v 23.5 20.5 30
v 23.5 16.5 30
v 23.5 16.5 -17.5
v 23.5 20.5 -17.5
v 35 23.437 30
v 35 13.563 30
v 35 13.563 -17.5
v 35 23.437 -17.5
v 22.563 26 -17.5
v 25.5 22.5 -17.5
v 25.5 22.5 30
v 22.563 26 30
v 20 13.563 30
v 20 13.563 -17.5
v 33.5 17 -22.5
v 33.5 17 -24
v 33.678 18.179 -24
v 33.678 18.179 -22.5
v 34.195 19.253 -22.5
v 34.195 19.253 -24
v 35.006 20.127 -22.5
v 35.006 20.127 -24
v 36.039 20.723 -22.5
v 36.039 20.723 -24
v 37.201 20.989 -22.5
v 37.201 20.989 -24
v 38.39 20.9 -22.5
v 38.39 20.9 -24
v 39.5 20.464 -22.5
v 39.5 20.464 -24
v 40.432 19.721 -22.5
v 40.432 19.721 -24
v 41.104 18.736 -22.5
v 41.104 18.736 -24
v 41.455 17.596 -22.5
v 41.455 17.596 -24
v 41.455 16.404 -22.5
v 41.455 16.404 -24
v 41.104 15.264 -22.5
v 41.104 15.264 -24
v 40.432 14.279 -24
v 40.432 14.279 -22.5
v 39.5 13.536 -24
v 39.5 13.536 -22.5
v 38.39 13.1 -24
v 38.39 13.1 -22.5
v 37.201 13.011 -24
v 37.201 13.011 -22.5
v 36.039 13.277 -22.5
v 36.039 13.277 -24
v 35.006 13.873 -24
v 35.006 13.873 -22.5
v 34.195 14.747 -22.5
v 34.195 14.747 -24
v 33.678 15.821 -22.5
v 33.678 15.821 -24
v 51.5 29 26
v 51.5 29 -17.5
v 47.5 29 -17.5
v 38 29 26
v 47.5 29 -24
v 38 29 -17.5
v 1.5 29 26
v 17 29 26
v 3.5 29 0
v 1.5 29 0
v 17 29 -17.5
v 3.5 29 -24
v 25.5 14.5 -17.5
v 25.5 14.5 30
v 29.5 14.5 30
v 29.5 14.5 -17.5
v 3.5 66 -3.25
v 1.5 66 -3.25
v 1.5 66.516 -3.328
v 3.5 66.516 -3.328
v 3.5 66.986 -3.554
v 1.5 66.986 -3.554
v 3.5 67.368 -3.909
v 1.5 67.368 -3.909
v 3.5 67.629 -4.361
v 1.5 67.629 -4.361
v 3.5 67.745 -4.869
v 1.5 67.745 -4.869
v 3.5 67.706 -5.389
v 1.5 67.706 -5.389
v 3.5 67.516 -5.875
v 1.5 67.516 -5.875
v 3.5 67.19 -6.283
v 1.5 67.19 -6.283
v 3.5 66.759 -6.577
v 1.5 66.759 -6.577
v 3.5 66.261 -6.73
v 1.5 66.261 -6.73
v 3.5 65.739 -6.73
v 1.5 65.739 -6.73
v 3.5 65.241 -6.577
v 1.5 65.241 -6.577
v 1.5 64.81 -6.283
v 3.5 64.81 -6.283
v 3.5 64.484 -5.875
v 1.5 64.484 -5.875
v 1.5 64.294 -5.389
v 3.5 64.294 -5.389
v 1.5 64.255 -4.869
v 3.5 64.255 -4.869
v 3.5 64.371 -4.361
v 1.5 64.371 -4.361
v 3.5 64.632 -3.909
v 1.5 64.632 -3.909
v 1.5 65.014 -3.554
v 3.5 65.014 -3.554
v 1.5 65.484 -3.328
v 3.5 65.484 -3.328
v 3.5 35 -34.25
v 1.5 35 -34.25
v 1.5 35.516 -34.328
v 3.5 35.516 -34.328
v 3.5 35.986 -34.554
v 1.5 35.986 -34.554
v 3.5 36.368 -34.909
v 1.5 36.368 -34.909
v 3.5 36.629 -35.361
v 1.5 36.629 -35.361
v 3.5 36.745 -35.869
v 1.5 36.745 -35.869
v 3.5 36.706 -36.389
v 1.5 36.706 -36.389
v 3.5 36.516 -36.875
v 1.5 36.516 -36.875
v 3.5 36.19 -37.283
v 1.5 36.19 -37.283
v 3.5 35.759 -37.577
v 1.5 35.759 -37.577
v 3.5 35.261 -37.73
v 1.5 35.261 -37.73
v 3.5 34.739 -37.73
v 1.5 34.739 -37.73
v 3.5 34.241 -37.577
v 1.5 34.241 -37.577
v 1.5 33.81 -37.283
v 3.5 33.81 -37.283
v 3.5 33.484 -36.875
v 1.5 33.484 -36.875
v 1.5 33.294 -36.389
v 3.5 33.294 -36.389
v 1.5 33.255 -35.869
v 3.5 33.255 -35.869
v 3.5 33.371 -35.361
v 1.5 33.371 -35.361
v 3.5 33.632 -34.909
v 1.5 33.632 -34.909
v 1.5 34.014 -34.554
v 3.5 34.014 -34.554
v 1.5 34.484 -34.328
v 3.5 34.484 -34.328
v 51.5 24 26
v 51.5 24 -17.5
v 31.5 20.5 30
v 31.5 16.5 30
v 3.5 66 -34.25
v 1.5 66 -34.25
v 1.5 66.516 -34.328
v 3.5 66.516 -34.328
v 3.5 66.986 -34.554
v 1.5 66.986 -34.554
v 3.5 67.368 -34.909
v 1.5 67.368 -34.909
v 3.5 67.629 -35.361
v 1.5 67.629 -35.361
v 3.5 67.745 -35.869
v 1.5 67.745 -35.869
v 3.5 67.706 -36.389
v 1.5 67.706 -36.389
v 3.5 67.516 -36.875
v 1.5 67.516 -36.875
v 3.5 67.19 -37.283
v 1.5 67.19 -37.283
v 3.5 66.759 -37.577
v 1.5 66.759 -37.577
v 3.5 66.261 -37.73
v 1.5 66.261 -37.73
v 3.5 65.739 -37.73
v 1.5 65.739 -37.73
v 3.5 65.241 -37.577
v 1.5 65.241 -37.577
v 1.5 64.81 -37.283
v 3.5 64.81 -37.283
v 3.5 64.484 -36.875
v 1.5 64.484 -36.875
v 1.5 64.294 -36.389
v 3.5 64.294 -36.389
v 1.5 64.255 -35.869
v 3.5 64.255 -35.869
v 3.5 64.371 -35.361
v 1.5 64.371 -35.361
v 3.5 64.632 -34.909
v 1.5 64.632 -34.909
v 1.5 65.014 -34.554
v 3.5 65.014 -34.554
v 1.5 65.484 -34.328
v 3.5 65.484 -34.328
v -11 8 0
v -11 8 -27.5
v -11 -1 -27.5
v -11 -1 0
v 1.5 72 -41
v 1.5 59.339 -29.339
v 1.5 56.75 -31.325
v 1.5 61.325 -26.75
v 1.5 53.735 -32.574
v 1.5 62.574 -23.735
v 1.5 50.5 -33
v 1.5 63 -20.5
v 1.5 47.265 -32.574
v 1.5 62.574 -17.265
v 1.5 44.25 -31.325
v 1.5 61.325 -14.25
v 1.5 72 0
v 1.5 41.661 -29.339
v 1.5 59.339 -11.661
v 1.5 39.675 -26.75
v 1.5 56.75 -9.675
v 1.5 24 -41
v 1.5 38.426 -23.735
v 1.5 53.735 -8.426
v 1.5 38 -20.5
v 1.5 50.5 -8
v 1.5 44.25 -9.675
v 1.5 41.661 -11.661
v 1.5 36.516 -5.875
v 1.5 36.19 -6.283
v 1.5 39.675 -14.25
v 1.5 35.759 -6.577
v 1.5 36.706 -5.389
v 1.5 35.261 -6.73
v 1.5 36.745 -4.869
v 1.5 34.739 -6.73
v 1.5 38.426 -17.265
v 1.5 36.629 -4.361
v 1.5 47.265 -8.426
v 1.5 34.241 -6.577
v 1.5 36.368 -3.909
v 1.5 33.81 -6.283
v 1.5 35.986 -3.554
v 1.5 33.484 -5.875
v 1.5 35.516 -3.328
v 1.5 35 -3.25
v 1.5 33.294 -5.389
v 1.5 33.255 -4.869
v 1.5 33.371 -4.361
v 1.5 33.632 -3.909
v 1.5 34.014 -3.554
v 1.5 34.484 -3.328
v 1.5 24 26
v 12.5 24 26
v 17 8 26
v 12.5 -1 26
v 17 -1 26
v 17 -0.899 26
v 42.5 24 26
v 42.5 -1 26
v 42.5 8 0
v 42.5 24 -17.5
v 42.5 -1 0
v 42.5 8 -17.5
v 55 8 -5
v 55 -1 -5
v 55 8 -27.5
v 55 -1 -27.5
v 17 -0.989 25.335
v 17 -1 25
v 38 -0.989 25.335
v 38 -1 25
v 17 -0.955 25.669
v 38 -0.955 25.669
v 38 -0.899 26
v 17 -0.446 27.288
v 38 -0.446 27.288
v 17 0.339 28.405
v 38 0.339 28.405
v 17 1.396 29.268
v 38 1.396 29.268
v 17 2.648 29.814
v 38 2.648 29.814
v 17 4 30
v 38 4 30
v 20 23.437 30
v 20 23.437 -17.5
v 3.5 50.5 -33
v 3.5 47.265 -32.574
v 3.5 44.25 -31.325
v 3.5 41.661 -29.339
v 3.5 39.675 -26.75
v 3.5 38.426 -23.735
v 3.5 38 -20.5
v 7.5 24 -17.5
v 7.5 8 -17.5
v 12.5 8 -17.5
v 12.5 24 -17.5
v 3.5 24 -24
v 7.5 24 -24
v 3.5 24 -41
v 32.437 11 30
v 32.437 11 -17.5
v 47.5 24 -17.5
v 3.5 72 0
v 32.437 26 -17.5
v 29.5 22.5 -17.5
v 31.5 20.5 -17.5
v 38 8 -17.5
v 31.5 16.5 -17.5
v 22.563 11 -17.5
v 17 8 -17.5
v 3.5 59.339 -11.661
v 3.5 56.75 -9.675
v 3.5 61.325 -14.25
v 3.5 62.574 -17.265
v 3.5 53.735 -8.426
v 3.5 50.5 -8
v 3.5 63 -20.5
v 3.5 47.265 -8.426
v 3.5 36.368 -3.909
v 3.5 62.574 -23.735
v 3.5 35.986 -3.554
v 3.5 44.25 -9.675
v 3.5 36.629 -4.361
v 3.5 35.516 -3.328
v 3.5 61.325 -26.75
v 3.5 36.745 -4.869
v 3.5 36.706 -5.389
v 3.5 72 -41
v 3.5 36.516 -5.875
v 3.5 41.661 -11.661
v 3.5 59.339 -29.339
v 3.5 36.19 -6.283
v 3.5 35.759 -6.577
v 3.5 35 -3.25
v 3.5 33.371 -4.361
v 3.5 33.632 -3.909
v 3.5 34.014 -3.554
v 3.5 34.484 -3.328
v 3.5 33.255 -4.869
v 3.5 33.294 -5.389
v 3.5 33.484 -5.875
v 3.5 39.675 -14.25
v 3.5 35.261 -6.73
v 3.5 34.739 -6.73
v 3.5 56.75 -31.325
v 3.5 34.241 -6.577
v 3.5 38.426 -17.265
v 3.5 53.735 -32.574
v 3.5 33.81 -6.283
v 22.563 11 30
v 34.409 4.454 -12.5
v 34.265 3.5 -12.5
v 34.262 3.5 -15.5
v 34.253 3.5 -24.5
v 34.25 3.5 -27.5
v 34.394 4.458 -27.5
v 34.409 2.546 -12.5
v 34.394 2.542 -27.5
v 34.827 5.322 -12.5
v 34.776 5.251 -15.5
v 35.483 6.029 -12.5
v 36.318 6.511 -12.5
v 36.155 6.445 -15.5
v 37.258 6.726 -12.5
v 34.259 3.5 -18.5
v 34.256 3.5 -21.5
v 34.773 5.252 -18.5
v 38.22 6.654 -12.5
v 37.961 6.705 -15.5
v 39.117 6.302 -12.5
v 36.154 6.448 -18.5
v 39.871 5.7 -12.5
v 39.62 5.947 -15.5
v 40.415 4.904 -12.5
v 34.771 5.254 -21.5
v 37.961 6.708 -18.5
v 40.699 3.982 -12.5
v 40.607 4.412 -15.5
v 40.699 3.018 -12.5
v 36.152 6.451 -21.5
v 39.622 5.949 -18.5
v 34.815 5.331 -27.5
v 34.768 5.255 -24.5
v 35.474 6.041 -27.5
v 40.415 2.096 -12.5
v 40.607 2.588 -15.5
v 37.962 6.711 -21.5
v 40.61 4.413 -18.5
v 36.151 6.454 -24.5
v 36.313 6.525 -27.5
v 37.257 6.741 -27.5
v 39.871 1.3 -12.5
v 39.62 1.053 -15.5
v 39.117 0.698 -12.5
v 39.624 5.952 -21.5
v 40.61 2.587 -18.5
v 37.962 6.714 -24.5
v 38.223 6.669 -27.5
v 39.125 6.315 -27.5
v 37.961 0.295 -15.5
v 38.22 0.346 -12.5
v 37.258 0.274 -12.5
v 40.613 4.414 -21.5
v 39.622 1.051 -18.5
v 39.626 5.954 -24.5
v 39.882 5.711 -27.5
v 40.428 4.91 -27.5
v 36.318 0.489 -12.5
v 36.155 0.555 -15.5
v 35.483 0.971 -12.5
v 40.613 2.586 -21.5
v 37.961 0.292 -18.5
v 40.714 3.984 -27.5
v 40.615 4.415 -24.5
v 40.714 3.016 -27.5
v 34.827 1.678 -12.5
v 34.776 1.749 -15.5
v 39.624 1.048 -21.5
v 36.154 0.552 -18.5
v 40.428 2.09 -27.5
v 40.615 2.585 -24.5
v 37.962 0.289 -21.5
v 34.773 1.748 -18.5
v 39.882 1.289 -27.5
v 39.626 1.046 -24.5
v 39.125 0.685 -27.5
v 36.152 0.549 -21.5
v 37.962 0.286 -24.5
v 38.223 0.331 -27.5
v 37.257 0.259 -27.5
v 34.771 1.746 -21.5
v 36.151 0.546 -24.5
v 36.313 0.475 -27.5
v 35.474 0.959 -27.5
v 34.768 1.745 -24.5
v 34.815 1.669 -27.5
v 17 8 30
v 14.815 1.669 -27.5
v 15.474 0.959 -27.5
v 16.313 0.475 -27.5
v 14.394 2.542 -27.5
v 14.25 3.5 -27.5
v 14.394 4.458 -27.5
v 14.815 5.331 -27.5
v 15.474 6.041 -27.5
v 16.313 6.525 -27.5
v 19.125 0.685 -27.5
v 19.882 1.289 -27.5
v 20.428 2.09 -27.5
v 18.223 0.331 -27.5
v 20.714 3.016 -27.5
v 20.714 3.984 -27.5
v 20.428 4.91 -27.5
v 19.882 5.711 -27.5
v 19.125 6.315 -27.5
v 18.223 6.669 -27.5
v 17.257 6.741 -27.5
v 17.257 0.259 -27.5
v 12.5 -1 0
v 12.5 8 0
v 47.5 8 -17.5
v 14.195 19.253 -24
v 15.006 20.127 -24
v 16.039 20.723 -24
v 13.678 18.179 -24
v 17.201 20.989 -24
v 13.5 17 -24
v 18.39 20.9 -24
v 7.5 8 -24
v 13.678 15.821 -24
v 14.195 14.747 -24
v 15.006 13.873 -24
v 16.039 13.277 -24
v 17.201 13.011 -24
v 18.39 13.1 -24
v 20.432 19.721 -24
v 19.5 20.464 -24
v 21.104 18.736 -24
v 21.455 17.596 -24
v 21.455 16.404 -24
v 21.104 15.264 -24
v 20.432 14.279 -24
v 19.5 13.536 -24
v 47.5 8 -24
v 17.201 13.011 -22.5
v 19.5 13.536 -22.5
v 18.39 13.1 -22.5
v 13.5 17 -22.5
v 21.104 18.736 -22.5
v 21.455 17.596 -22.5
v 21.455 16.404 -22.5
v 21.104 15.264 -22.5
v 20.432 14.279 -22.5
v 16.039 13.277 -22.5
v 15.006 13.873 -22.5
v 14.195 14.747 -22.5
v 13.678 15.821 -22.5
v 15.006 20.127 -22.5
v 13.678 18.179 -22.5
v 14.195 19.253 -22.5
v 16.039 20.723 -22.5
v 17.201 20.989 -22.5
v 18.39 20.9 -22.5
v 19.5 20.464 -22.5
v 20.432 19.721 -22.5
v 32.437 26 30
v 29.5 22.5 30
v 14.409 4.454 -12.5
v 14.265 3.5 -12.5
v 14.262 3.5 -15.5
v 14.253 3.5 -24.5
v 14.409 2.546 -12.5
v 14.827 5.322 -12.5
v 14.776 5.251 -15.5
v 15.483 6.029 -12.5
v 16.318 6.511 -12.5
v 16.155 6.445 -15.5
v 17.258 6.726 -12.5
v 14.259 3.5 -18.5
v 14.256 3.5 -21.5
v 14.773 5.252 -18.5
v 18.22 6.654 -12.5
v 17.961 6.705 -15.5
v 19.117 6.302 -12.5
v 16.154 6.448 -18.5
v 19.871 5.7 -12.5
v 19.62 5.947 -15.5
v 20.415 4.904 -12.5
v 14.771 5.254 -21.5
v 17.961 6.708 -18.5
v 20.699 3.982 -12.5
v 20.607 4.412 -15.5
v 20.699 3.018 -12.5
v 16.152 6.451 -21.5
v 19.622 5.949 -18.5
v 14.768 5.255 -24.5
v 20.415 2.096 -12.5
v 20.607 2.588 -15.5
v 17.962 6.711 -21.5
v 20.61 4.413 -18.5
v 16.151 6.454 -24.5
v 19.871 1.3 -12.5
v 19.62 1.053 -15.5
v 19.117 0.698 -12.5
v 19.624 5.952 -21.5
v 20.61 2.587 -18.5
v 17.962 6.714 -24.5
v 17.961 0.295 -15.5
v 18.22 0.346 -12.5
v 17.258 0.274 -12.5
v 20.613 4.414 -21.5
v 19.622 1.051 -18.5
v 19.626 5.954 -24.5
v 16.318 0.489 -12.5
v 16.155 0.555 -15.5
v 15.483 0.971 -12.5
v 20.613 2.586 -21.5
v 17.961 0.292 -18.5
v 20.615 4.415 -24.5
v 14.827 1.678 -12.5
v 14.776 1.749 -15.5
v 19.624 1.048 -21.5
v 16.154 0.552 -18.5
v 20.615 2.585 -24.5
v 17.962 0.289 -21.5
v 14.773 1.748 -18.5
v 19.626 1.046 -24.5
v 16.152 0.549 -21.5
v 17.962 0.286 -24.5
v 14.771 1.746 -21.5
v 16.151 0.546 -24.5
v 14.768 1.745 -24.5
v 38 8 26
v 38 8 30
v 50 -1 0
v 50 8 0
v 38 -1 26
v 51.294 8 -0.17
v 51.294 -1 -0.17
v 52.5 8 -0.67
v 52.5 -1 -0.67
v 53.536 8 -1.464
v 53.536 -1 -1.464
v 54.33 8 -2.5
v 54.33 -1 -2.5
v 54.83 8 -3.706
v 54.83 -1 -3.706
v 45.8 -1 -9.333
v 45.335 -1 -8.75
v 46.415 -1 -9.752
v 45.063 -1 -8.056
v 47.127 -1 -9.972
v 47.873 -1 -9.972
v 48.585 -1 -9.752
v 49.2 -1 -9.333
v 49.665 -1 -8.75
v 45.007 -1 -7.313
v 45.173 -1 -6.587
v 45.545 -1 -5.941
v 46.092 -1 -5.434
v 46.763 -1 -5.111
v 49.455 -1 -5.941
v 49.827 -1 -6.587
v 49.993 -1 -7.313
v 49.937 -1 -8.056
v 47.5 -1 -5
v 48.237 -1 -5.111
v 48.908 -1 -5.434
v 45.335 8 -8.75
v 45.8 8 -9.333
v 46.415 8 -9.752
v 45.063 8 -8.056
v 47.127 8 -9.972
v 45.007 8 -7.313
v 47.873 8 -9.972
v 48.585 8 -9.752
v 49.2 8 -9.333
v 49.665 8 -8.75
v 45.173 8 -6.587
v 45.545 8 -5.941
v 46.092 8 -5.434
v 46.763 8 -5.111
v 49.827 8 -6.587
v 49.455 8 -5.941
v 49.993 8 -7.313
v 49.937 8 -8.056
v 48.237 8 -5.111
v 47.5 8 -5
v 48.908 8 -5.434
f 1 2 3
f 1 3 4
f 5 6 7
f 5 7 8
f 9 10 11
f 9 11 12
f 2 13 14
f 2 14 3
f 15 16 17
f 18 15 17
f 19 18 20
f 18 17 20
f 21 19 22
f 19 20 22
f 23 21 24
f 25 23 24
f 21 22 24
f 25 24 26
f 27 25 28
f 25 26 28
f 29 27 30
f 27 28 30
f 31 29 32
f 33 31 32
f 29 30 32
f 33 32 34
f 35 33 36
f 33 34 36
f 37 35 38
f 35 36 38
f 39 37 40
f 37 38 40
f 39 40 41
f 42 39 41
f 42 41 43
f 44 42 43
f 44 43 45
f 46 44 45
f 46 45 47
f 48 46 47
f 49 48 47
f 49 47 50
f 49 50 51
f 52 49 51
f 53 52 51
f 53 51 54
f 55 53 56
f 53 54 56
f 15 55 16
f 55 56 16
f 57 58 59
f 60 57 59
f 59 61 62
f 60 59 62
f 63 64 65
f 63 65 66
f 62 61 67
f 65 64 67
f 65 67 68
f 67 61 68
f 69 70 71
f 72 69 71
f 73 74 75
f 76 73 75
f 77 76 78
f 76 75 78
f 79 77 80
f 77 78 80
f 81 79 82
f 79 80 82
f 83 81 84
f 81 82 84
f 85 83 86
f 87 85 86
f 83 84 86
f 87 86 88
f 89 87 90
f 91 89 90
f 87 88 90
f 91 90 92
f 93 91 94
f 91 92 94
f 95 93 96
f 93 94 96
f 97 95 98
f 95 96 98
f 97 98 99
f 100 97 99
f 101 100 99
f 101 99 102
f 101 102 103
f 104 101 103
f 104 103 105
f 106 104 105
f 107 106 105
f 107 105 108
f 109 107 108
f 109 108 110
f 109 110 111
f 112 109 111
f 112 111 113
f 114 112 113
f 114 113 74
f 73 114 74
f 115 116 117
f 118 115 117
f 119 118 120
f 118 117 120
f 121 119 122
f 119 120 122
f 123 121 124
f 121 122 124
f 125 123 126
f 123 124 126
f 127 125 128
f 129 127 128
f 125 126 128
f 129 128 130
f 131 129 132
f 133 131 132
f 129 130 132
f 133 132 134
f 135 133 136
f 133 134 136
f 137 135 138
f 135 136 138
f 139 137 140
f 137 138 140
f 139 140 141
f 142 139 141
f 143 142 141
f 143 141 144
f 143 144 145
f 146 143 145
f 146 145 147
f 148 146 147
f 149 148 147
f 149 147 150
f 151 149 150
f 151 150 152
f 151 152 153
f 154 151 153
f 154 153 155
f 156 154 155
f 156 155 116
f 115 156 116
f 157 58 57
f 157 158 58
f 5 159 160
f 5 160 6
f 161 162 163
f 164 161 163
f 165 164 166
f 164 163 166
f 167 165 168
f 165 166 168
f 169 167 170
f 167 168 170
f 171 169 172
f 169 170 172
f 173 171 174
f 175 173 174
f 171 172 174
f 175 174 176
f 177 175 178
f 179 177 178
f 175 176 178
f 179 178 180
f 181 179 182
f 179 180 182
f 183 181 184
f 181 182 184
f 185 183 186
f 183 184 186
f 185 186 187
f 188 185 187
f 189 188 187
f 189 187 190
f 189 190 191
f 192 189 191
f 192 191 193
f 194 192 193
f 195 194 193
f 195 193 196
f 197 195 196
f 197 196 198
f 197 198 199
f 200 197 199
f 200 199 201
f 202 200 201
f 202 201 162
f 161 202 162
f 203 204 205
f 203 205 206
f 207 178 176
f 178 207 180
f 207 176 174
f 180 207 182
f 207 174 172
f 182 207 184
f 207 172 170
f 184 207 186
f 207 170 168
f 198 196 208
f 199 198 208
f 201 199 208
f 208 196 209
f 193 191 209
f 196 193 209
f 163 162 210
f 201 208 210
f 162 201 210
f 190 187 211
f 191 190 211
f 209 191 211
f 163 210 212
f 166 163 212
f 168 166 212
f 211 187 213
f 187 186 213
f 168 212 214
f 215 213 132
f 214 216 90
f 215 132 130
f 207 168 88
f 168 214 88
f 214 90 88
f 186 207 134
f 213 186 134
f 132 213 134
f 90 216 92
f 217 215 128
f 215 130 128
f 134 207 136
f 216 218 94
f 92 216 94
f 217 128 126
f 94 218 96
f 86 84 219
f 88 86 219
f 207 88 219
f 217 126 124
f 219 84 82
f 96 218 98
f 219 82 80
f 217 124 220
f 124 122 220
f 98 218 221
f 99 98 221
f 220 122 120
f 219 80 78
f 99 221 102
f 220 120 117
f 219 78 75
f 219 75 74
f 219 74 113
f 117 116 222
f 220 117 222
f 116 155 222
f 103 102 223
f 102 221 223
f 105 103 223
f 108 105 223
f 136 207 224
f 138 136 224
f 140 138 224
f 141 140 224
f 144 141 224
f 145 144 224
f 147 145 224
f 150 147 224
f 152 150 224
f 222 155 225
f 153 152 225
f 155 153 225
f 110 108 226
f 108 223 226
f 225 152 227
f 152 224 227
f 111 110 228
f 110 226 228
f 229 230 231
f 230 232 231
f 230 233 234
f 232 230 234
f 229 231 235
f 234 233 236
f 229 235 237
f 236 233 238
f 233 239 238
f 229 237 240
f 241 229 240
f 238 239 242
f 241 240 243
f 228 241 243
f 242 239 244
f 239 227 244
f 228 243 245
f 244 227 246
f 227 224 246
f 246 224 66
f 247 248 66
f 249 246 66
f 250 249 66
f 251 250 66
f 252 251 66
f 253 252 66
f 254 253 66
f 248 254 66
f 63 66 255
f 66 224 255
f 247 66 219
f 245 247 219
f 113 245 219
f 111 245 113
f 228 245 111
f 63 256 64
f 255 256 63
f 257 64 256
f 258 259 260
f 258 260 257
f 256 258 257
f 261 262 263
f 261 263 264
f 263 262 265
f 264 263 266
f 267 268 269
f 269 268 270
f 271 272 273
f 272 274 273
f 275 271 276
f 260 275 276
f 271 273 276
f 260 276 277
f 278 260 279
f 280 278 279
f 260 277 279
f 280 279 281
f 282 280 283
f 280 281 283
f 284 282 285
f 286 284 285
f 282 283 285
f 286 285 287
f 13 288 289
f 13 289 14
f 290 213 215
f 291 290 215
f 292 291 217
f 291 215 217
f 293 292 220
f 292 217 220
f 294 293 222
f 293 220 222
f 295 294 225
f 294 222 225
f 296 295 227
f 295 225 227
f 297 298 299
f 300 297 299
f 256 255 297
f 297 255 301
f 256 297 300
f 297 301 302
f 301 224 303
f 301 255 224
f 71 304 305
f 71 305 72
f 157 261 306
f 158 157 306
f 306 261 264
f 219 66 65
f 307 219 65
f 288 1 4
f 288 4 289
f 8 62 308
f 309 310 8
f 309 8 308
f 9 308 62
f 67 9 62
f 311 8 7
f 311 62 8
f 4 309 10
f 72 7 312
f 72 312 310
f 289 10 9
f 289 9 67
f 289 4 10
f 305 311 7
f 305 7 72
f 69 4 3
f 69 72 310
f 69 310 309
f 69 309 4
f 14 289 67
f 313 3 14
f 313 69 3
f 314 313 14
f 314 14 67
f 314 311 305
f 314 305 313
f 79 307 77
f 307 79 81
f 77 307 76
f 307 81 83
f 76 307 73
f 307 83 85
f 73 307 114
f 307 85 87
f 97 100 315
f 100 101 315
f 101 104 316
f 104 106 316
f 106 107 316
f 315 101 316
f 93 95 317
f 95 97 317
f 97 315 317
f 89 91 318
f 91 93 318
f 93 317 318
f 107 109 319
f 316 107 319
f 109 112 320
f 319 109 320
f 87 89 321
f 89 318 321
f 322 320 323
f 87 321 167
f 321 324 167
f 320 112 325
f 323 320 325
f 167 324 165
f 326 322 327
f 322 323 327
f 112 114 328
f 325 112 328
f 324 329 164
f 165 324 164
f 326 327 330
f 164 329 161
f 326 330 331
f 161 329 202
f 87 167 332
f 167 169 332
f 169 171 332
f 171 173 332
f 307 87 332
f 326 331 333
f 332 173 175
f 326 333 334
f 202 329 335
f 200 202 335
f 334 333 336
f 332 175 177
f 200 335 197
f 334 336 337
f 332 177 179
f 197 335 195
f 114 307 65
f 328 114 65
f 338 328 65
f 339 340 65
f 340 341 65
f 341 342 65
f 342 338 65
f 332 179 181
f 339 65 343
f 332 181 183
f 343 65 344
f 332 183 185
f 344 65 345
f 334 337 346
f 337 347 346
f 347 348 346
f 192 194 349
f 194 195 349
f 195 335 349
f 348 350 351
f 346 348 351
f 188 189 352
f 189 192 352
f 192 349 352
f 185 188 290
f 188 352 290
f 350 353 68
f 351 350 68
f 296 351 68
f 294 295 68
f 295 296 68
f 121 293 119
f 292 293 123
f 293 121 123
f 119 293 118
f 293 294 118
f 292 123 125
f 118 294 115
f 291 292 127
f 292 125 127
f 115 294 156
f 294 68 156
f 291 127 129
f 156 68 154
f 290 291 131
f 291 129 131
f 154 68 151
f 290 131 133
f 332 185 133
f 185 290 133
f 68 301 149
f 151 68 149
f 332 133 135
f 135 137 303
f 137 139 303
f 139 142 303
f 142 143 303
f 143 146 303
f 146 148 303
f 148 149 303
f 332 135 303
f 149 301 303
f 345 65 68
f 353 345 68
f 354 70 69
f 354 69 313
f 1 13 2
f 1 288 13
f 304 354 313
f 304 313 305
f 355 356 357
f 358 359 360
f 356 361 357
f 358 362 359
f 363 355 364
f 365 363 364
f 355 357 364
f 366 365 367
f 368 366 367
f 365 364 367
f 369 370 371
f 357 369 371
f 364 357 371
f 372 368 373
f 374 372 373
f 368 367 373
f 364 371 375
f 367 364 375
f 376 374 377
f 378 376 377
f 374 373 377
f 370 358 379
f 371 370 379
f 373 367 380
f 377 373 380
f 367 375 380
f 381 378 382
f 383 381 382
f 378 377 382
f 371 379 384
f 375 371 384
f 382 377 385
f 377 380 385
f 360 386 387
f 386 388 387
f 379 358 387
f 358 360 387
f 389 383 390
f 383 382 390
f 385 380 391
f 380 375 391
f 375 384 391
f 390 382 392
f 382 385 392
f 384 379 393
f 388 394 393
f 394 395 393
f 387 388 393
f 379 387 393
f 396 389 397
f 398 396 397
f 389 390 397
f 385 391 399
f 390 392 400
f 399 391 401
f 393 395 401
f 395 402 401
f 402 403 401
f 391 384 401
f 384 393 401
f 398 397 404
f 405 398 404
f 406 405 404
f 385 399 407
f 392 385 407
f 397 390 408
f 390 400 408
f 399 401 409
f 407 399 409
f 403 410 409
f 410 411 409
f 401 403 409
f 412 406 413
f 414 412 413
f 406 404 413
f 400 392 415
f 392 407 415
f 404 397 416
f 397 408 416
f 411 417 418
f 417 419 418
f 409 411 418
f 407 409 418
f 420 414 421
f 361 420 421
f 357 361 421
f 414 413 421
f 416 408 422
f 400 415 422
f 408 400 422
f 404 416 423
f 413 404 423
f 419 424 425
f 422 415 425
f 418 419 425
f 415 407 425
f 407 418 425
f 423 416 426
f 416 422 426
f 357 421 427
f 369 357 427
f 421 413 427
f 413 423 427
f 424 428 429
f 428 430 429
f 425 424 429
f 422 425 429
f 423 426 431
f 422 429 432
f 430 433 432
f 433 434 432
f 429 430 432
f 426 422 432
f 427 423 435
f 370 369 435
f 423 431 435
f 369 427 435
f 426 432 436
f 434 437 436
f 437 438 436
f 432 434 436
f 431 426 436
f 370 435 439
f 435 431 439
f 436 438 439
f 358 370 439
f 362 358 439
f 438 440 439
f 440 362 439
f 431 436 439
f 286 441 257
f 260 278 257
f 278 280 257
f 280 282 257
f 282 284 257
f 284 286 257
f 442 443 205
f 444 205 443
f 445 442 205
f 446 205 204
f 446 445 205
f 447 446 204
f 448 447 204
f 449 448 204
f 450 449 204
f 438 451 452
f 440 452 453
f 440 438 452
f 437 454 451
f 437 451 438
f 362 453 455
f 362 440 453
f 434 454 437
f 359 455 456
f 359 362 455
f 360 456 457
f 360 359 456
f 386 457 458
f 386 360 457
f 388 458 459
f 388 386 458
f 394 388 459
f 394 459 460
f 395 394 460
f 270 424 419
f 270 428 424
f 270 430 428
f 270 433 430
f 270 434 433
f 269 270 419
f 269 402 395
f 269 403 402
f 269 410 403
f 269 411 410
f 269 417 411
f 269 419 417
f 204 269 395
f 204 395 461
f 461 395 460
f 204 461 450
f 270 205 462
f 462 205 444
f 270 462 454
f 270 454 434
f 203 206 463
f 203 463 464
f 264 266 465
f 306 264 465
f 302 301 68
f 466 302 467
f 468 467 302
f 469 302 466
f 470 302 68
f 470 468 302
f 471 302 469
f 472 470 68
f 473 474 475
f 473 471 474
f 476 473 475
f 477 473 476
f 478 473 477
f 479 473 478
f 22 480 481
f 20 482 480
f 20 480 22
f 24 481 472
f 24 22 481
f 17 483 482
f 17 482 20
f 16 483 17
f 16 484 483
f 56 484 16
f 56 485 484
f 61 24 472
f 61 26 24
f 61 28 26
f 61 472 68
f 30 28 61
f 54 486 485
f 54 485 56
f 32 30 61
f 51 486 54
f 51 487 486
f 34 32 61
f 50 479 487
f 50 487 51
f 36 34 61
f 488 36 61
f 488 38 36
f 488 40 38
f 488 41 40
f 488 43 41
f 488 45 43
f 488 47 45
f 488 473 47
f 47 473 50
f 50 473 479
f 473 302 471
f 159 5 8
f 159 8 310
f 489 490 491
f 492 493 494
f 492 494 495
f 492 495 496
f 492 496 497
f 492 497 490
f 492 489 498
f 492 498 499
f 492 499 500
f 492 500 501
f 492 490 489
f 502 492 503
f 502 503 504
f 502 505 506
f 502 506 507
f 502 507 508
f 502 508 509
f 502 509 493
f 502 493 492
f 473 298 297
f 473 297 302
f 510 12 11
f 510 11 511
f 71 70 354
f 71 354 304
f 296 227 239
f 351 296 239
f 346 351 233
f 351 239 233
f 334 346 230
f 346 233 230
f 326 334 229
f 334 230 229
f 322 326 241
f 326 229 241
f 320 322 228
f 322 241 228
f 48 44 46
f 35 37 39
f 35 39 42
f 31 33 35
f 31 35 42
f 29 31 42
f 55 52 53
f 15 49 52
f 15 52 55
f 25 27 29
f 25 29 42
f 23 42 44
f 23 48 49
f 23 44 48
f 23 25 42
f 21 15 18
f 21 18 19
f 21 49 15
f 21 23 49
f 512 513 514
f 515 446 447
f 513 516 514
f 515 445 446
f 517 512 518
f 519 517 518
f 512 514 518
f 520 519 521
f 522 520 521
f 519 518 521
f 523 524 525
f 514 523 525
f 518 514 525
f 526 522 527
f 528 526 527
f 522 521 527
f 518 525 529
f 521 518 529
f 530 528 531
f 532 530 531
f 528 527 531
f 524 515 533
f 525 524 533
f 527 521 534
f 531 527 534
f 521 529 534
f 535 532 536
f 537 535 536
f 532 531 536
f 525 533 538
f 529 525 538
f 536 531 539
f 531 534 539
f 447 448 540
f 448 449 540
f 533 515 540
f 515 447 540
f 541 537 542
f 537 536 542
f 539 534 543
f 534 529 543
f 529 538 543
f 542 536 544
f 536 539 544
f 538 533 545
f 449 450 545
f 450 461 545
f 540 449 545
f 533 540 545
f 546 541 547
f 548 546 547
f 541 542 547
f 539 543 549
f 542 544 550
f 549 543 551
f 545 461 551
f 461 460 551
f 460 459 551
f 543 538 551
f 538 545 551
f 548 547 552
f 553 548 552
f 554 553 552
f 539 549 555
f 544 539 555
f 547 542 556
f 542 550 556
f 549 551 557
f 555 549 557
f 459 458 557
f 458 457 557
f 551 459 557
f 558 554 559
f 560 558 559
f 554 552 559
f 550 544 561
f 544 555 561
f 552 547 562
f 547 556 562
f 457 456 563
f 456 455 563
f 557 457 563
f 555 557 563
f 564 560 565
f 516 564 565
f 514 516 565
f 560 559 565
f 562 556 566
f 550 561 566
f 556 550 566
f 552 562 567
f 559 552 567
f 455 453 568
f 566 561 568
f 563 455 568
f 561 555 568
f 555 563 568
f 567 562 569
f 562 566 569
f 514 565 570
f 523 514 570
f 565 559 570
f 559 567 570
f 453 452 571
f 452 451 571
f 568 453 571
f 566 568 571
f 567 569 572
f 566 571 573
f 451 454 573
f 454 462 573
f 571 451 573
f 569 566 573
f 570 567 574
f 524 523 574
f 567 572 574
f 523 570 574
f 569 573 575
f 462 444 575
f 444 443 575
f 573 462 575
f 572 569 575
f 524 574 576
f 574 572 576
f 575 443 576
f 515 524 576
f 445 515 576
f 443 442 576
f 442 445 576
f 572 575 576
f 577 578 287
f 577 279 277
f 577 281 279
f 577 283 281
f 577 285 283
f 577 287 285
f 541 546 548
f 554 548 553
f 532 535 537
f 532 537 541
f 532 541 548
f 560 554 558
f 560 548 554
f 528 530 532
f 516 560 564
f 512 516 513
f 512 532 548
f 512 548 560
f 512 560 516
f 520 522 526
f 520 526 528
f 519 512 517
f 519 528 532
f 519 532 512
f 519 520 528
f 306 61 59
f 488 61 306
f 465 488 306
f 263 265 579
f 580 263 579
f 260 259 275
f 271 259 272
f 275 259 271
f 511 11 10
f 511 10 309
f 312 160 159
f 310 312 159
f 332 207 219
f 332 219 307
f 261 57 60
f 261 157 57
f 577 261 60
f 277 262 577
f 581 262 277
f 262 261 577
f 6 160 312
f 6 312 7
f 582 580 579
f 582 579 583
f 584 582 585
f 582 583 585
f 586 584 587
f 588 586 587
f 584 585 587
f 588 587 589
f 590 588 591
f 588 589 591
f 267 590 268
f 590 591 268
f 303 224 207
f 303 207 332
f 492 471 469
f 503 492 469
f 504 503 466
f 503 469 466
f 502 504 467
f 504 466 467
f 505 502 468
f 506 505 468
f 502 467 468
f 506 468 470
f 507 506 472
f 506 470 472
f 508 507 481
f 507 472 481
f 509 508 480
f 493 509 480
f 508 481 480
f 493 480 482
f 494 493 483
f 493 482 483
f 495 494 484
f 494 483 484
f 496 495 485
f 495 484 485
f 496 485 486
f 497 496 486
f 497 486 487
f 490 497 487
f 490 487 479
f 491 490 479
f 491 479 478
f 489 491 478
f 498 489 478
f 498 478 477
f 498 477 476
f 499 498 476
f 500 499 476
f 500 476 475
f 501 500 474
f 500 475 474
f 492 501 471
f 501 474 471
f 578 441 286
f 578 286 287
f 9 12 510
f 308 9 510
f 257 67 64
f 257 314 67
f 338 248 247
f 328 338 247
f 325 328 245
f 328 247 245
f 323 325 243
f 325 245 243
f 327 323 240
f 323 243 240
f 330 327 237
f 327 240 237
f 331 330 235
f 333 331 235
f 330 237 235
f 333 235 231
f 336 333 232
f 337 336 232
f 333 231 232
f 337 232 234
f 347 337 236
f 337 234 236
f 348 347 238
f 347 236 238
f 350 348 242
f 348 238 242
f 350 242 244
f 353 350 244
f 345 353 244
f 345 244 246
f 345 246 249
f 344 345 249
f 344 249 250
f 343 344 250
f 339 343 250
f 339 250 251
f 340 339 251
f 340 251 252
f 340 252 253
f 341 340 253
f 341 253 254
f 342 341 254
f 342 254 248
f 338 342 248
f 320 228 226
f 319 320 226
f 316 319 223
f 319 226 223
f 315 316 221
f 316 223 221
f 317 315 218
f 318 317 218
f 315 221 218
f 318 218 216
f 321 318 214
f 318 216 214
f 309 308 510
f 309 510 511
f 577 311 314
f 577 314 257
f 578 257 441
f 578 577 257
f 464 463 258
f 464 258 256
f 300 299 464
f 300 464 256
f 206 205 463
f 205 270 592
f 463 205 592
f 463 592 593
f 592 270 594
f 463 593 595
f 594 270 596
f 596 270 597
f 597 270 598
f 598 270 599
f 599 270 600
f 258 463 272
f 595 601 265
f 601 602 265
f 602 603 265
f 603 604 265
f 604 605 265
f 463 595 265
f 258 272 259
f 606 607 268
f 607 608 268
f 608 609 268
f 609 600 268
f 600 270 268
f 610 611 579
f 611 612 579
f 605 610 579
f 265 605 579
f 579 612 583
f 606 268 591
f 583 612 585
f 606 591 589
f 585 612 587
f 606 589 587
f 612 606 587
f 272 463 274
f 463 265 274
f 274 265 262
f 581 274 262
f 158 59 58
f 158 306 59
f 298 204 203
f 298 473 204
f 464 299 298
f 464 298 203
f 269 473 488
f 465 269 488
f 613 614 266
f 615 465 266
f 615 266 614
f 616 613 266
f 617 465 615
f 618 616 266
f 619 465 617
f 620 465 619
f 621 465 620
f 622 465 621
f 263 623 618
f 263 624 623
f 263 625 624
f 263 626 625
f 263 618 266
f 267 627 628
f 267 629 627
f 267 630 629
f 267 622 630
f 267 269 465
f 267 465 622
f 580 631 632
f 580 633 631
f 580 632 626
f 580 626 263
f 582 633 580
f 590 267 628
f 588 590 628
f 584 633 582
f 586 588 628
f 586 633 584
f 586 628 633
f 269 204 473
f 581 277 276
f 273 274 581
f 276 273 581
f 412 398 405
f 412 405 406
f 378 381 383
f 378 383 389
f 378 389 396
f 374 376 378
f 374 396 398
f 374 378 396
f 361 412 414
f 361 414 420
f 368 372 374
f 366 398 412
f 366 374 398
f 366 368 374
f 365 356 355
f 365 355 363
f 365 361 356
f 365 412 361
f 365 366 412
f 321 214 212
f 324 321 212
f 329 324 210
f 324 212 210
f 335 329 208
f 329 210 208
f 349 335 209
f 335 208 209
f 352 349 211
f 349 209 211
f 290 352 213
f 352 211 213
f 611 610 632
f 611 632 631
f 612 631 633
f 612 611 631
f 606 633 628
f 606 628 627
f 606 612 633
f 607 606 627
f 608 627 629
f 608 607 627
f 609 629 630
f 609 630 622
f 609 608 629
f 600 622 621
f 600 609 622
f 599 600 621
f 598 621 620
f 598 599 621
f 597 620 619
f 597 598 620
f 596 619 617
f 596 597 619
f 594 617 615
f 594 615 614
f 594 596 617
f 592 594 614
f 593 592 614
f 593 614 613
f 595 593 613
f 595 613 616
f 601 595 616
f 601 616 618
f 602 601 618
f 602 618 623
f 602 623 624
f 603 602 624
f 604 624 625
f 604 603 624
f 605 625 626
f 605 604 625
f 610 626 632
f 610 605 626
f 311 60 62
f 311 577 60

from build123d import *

# Parameters (mm, degrees)
BOSS_EXTRUDE2_DEPTH          = 8
BOSS_EXTRUDE2_DEPTH_BACK     = 1
SKETCH1_R                    = 2.5
CUT_EXTRUDE1_DEPTH           = 79.300702423
CUT_EXTRUDE1_DEPTH_BACK      = 79.300702423
SKETCH2_R                    = 2.5
SKETCH3_R                    = 3.25
CUT_EXTRUDE5_DEPTH           = 15
CUT_EXTRUDE5_DRAFT           = -0.0573
CUT_EXTRUDE5_PROFILE_2_DEPTH = 15
CUT_EXTRUDE5_PROFILE_2_DRAFT = -0.0573
SKETCH5_W                    = 4.5
SKETCH5_H                    = 6.5
BOSS_EXTRUDE3_DEPTH          = 14.5
SKETCH6_R                    = 4
CUT_EXTRUDE4_DEPTH           = 1.5
SKETCH12_W                   = 10.5
SKETCH12_H                   = 30
BOSS_EXTRUDE7_DEPTH          = 9
SKETCH15_W                   = 9
SKETCH15_H                   = 6.5
BOSS_EXTRUDE8_DEPTH          = 3.5
BOSS_EXTRUDE9_DEPTH          = 54
FILLET4_R                    = 5
SKETCH18_W                   = 9.873697418
SKETCH18_H                   = 6.5
BOSS_EXTRUDE11_DEPTH         = 0.5
SKETCH20_W                   = 4
SKETCH20_H                   = 17.5
BOSS_EXTRUDE12_DEPTH         = 18
BOSS_EXTRUDE13_DEPTH         = 11
BOSS_EXTRUDE13_DEPTH_BACK    = 4
SKETCH22_W                   = 17.5
SKETCH22_H                   = 4
SKETCH25_W                   = 2
SKETCH25_H                   = 17.5
BOSS_EXTRUDE14_DEPTH         = 41
SKETCH28_W                   = 41
SKETCH28_H                   = 45
BOSS_EXTRUDE15_DEPTH         = 2
SKETCH29_R                   = 1.75
CUT_EXTRUDE8_DEPTH           = 9
BOSS_EXTRUDE16_DEPTH         = 9
BOSS_EXTRUDE16_DEPTH_BACK    = 4
SKETCH30_W                   = 17.5
SKETCH30_H                   = 2
CUT_EXTRUDE9_DEPTH           = 9
SKETCH32_W                   = 13
SKETCH32_H                   = 4
BOSS_EXTRUDE17_DEPTH         = 23.5
SKETCH33_W                   = 0.5
SKETCH33_H                   = 17.5
BOSS_EXTRUDE18_DEPTH         = 20
SKETCH34_W                   = 4.5
SKETCH34_H                   = 25
SKETCH34_W_2                 = 15.5
SKETCH34_H_2                 = 4
SKETCH34_W_3                 = 9
BOSS_EXTRUDE19_DEPTH         = 26
SKETCH35_W                   = 9.873697418
SKETCH35_H                   = 0.5
BOSS_EXTRUDE20_DEPTH         = 47.5
BOSS_EXTRUDE21_DEPTH         = 47.5
SKETCH38_W                   = 0.419549816
SKETCH38_H                   = 18.5
CUT_EXTRUDE10_DEPTH          = 90.5
SKETCH46_W                   = 22.5
SKETCH46_H                   = 9
SKETCH46_W_2                 = 5
BOSS_EXTRUDE26_DEPTH         = 11.5
SKETCH47_W                   = 27.5
SKETCH47_H                   = 9
BOSS_EXTRUDE27_DEPTH         = 11
SKETCH48_W                   = 5
SKETCH48_H                   = 6.5
BOSS_EXTRUDE31_DEPTH         = 18.5
SKETCH50_R                   = 4
CUT_EXTRUDE11_DEPTH          = 1.5
SKETCH51_W                   = 9.626242636
SKETCH51_H                   = 9.125298808
BOSS_EXTRUDE32_DEPTH         = 1.5
BOSS_EXTRUDE35_DEPTH         = 47.5
SKETCH55_W                   = 9.873697418
SKETCH55_H                   = 0.5
CUT_EXTRUDE12_DEPTH          = 47.5
BOSS_EXTRUDE37_DEPTH         = 47.5
CUT_EXTRUDE17_DEPTH          = 47.5
SKETCH62_W                   = 8
SKETCH62_H                   = 8
CUT_EXTRUDE18_DEPTH          = 47.5
SKETCH63_W                   = 13
SKETCH63_H                   = 4
CUT_EXTRUDE20_DEPTH          = 17
SKETCH64_W                   = 0.5
SKETCH64_H                   = 1.5
BOSS_EXTRUDE38_DEPTH         = 6.5
SKETCH65_W                   = 7
SKETCH65_H                   = 3
CUT_EXTRUDE21_DEPTH          = 1.5
BOSS_EXTRUDE39_START         = -2
BOSS_EXTRUDE39_DEPTH         = 2
CUT_EXTRUDE22_DEPTH          = 155
BOSS_EXTRUDE40_DEPTH         = 1.5
SKETCH70_W                   = 2
SKETCH70_H                   = 41
BOSS_EXTRUDE41_DEPTH         = 3
BOSS_EXTRUDE42_DEPTH         = 1


with BuildPart() as part:
    # Sketch1 → Boss-Extrude2 (new, two sides: drawn at the far end of the back side and taken through both)
    with BuildSketch(Plane(origin=(0, 0, 0), x_dir=(1, 0, 0), z_dir=(0, 1, 0)).offset(-BOSS_EXTRUDE2_DEPTH_BACK)):
        with BuildLine():
            Line((5, 0), (50, 0))
            ThreePointArc((50, 0), (53.535533906, 1.464466094), (55, 5))
            Line((55, 5), (55, 50))
            ThreePointArc((55, 50), (53.535533906, 53.535533906), (50, 55))
            Line((50, 55), (5, 55))
            ThreePointArc((5, 55), (1.464466094, 53.535533906), (0, 50))
            Line((0, 50), (0, 5))
            ThreePointArc((0, 5), (1.464466094, 1.464466094), (5, 0))
        make_face()
        with Locations(Location((7.5, 47.5, 0), (0, 0, 270))):
            Circle(SKETCH1_R, mode=Mode.SUBTRACT)
        with Locations(Location((47.5, 47.5, 0), (0, 0, 270))):
            Circle(SKETCH1_R, mode=Mode.SUBTRACT)
        with Locations(Location((47.5, 7.5, 0), (0, 0, 270))):
            Circle(SKETCH1_R, mode=Mode.SUBTRACT)
        with Locations(Location((7.5, 7.5, 0), (0, 0, 270))):
            Circle(SKETCH1_R, mode=Mode.SUBTRACT)
    extrude(amount=BOSS_EXTRUDE2_DEPTH + BOSS_EXTRUDE2_DEPTH_BACK)

    # Sketch2 → Cut-Extrude1 (cut, two sides: drawn at the far end of the back side and taken through both)
    with BuildSketch(Plane(origin=(0, 8, 0), x_dir=(1, 0, 0), z_dir=(0, 1, 0)).offset(-CUT_EXTRUDE1_DEPTH_BACK)):
        with BuildLine():
            Line((0, 50), (0, 27.5))
            Line((0, 27.5), (55, 27.5))
            Line((55, 27.5), (55, 50))
            ThreePointArc((55, 50), (53.535533906, 53.535533906), (50, 55))
            Line((50, 55), (5, 55))
            ThreePointArc((5, 55), (1.464466094, 53.535533906), (0, 50))
        make_face()
        with Locations((7.5, 47.5)):
            Circle(SKETCH2_R, mode=Mode.SUBTRACT)
        with Locations((47.5, 47.5)):
            Circle(SKETCH2_R, mode=Mode.SUBTRACT)
    extrude(amount=CUT_EXTRUDE1_DEPTH + CUT_EXTRUDE1_DEPTH_BACK, mode=Mode.SUBTRACT)


with BuildPart() as cut_extrude5_tool:
    # Sketch3 → Cut-Extrude5 (with draft: the straight prism first)
    with BuildSketch(Plane(origin=(0, 0, -27.5), x_dir=(-1, 0, 0), z_dir=(0, 0, -1))):
        with Locations((-37.5, 3.5)):
            Circle(SKETCH3_R)
    extrude(amount=-CUT_EXTRUDE5_DEPTH)
    # Cut-Extrude5: the draft: its side faces are tilted about the plane it starts from
    cut_extrude5_sides = [cut_extrude5_tool.faces().sort_by_distance(p)[0] for p in [
        (40.75, 3.5, -20),
    ]]
    draft(cut_extrude5_sides, Plane(origin=(0, 0, -27.5), x_dir=(-1, 0, 0), z_dir=(0, 0, -1)), CUT_EXTRUDE5_DRAFT)


with BuildPart() as part_1:
    add(part.part)

    # Cut-Extrude5: cut by cut_extrude5_tool
    add(cut_extrude5_tool.part, mode=Mode.SUBTRACT)


with BuildPart() as cut_extrude5_profile_2_tool:
    # Sketch3 → Cut-Extrude5 profile 2 (with draft: the straight prism first)
    with BuildSketch(Plane(origin=(0, 0, -27.5), x_dir=(-1, 0, 0), z_dir=(0, 0, -1))):
        with Locations((-17.5, 3.5)):
            Circle(SKETCH3_R)
    extrude(amount=-CUT_EXTRUDE5_PROFILE_2_DEPTH)
    # Cut-Extrude5 profile 2: the draft: its side faces are tilted about the plane it starts from
    cut_extrude5_profile_2_sides = [cut_extrude5_profile_2_tool.faces().sort_by_distance(p)[0] for p in [
        (20.75, 3.5, -20),
    ]]
    draft(cut_extrude5_profile_2_sides, Plane(origin=(0, 0, -27.5), x_dir=(-1, 0, 0), z_dir=(0, 0, -1)), CUT_EXTRUDE5_PROFILE_2_DRAFT)


with BuildPart() as part_2:
    add(part_1.part)

    # Cut-Extrude5 profile 2: cut by cut_extrude5_profile_2_tool
    add(cut_extrude5_profile_2_tool.part, mode=Mode.SUBTRACT)

    # Sketch5 → Boss-Extrude3 (add)
    with BuildSketch(Plane(origin=(0, 8, 0), x_dir=(1, 0, 0), z_dir=(0, 1, 0))):
        with Locations((25.25, 20.75)):
            Rectangle(SKETCH5_W, SKETCH5_H)
        with Locations((29.75, 20.75)):
            Rectangle(SKETCH5_W, SKETCH5_H)
    extrude(amount=BOSS_EXTRUDE3_DEPTH)

    # Sketch6 → Cut-Extrude4 (cut)
    with BuildSketch(Plane(origin=(0, 0, -24), x_dir=(-1, 0, 0), z_dir=(0, 0, -1))):
        with Locations((-27.5, 17)):
            Circle(SKETCH6_R)
    extrude(amount=-CUT_EXTRUDE4_DEPTH, mode=Mode.SUBTRACT)

    # Sketch12 → Boss-Extrude7 (add)
    with BuildSketch(Plane(origin=(0, 8, 0), x_dir=(1, 0, 0), z_dir=(0, 1, 0))):
        with Locations((32.75, -15)):
            Rectangle(SKETCH12_W, SKETCH12_H)
        with Locations((22.25, -15)):
            Rectangle(SKETCH12_W, SKETCH12_H)
    extrude(amount=-BOSS_EXTRUDE7_DEPTH)

    # Sketch15 → Boss-Extrude8 (add)
    with BuildSketch(Plane(origin=(0, 22.5, 0), x_dir=(1, 0, 0), z_dir=(0, 1, 0))):
        with Locations((27.5, 20.75)):
            Rectangle(SKETCH15_W, SKETCH15_H)
    extrude(amount=BOSS_EXTRUDE8_DEPTH)

    # Sketch11 → Boss-Extrude9 (add)
    with BuildSketch(Plane(origin=(0, 0, -24), x_dir=(-1, 0, 0), z_dir=(0, 0, -1))):
        Polygon((-32.436848709, 26), (-29.5, 22.5), (-29.5, 26), align=None)
        Polygon((-29.5, 22.5), (-27.5, 22.5), (-25.5, 22.5), (-25.5, 26), (-29.5, 26), align=None)
        Polygon((-25.5, 26), (-25.5, 22.5), (-22.563151291, 26), align=None)
    extrude(amount=-BOSS_EXTRUDE9_DEPTH)

    # Fillet4
    fillet4_edges = [part_2.edges().sort_by_distance(p)[0] for p in [
        (27.5, -1, 30),
    ]]
    fillet(fillet4_edges, radius=FILLET4_R)

    # Sketch18 → Boss-Extrude11 (add)
    with BuildSketch(Plane(origin=(0, 26, 0), x_dir=(1, 0, 0), z_dir=(0, 1, 0))):
        with Locations((27.5, 20.75)):
            Rectangle(SKETCH18_W, SKETCH18_H)
    extrude(amount=BOSS_EXTRUDE11_DEPTH)

    # Sketch20 → Boss-Extrude12 (add)
    with BuildSketch(Plane(origin=(0, 8, 0), x_dir=(1, 0, 0), z_dir=(0, 1, 0))):
        with Locations((14.5, 8.75)):
            Rectangle(SKETCH20_W, SKETCH20_H)
        with Locations((40.5, 8.75)):
            Rectangle(SKETCH20_W, SKETCH20_H)
    extrude(amount=BOSS_EXTRUDE12_DEPTH)

    # Sketch22 → Boss-Extrude13 (add, two sides: drawn at the far end of the back side and taken through both)
    with BuildSketch(Plane.ZY.offset(-12.5).offset(-BOSS_EXTRUDE13_DEPTH_BACK)):
        with Locations((-8.75, 26)):
            Rectangle(SKETCH22_W, SKETCH22_H)
    extrude(amount=BOSS_EXTRUDE13_DEPTH + BOSS_EXTRUDE13_DEPTH_BACK)

    # Sketch25 → Boss-Extrude14 (add)
    with BuildSketch(Plane(origin=(0, 28, 0), x_dir=(1, 0, 0), z_dir=(0, 1, 0))):
        with Locations((2.5, 8.75)):
            Rectangle(SKETCH25_W, SKETCH25_H)
    extrude(amount=BOSS_EXTRUDE14_DEPTH)

    # Sketch28 → Boss-Extrude15 (add)
    with BuildSketch(Plane.ZY.offset(-1.5)):
        with Locations((-20.5, 46.5)):
            Rectangle(SKETCH28_W, SKETCH28_H)
    extrude(amount=-BOSS_EXTRUDE15_DEPTH)

    # Sketch29 → Cut-Extrude8 (cut)
    with BuildSketch(Plane.ZY.offset(-1.5)):
        with Locations((-36, 35)):
            Circle(SKETCH29_R)
        with Locations((-5, 66)):
            Circle(SKETCH29_R)
        with Locations((-5, 35)):
            Circle(SKETCH29_R)
        with Locations((-36, 66)):
            Circle(SKETCH29_R)
    extrude(amount=-CUT_EXTRUDE8_DEPTH, mode=Mode.SUBTRACT)

    # Sketch30 → Boss-Extrude16 (add, two sides: drawn at the far end of the back side and taken through both)
    with BuildSketch(Plane(origin=(42.5, 0, 0), x_dir=(0, 0, -1), z_dir=(1, 0, 0)).offset(-BOSS_EXTRUDE16_DEPTH_BACK)):
        with Locations((8.75, 25)):
            Rectangle(SKETCH30_W, SKETCH30_H)
        with Locations((8.75, 27)):
            Rectangle(SKETCH30_W, SKETCH30_H)
    extrude(amount=BOSS_EXTRUDE16_DEPTH + BOSS_EXTRUDE16_DEPTH_BACK)

    # Sketch31 → Cut-Extrude9 (cut)
    with BuildSketch(Plane(origin=(3.5, 0, 0), x_dir=(0, 0, -1), z_dir=(1, 0, 0))):
        with BuildLine():
            ThreePointArc((30.5, 47), (27.571067812, 54.071067812), (20.5, 57))
            Line((20.5, 57), (20.5, 47))
            Line((20.5, 47), (30.5, 47))
        make_face()
        with BuildLine():
            Line((20.5, 47), (20.5, 57))
            ThreePointArc((20.5, 57), (13.428932188, 39.928932188), (30.5, 47))
            Line((30.5, 47), (20.5, 47))
        make_face()
    extrude(amount=-CUT_EXTRUDE9_DEPTH, mode=Mode.SUBTRACT)

    # Sketch32 → Boss-Extrude17 (add)
    with BuildSketch(Plane(origin=(0, 0, -17.5), x_dir=(-1, 0, 0), z_dir=(0, 0, -1))):
        with Locations((-10, 26)):
            Rectangle(SKETCH32_W, SKETCH32_H)
    extrude(amount=BOSS_EXTRUDE17_DEPTH)

    # Sketch33 → Boss-Extrude18 (add)
    with BuildSketch(Plane(origin=(0, 8, 0), x_dir=(1, 0, 0), z_dir=(0, 1, 0))):
        with Locations((38.25, 8.75)):
            Rectangle(SKETCH33_W, SKETCH33_H)
        with Locations((16.75, 8.75)):
            Rectangle(SKETCH33_W, SKETCH33_H)
    extrude(amount=BOSS_EXTRUDE18_DEPTH)

    # Sketch34 → Boss-Extrude19 (add)
    with BuildSketch(Plane.XY):
        with Locations((14.75, 11.5)):
            Rectangle(SKETCH34_W, SKETCH34_H)
        with Locations((9.25, 26)):
            Rectangle(SKETCH34_W_2, SKETCH34_H_2)
        Polygon((42.5, 24), (42.5, 28), (38, 28), (38, 8), (38, -1), (42.5, -1), (42.5, 8), align=None)
        with Locations((47, 26)):
            Rectangle(SKETCH34_W_3, SKETCH34_H_2)
    extrude(amount=BOSS_EXTRUDE19_DEPTH)

    # Sketch35 → Boss-Extrude20 (add)
    with BuildSketch(Plane.XY.offset(-17.5)):
        with Locations((27.5, 26.25)):
            Rectangle(SKETCH35_W, SKETCH35_H)
    extrude(amount=BOSS_EXTRUDE20_DEPTH)

    # Sketch37 → Boss-Extrude21 (add)
    with BuildSketch(Plane.XY.offset(-17.5)):
        Polygon((23, 8), (25.5, 8), (25.5, 12), (23, 9.020616019), align=None)
        Polygon((25.5, 8), (27.5, 8), (29.5, 8), (29.5, 12), (25.5, 12), align=None)
        Polygon((29.5, 12), (29.5, 8), (32, 8), (32, 9.020616019), align=None)
        Polygon((29.5, 8), (27.5, 8), (25.5, 8), (23, 8), (23, 9.020616019), (21.863844179, 7.666598237), (33.136155821, 7.666598237), (32, 9.020616019), (32, 8), align=None)
    extrude(amount=BOSS_EXTRUDE21_DEPTH)

    # Sketch38 → Cut-Extrude10 (cut)
    with BuildSketch(Plane.XY.offset(30)):
        with Locations((22.353376383, 17.25)):
            Rectangle(SKETCH38_W, SKETCH38_H)
        with Locations((32.646623617, 17.25)):
            Rectangle(SKETCH38_W, SKETCH38_H)
    extrude(amount=-CUT_EXTRUDE10_DEPTH, mode=Mode.SUBTRACT)

    # Sketch46 → Boss-Extrude26 (add)
    with BuildSketch(Plane.ZY):
        with Locations((-16.25, 3.5)):
            Rectangle(SKETCH46_W, SKETCH46_H)
        with Locations((-2.5, 3.5)):
            Rectangle(SKETCH46_W_2, SKETCH46_H)
    extrude(amount=-BOSS_EXTRUDE26_DEPTH)

    # Sketch47 → Boss-Extrude27 (add)
    with BuildSketch(Plane.ZY):
        with Locations((-13.75, 3.5)):
            Rectangle(SKETCH47_W, SKETCH47_H)
    extrude(amount=BOSS_EXTRUDE27_DEPTH)

    # Sketch48 → Boss-Extrude31 (add)
    with BuildSketch(Plane(origin=(0, 8, 0), x_dir=(1, 0, 0), z_dir=(0, 1, 0))):
        Polygon((42.5, 17.5), (42.5, 24), (32, 24), (32, 17.5), (32.436848709, 17.5), (38, 17.5), align=None)
        with Locations((45, 20.75)):
            Rectangle(SKETCH48_W, SKETCH48_H)
        Polygon((12.5, 24), (12.5, 17.5), (17, 17.5), (22.563151291, 17.5), (23, 17.5), (23, 24), align=None)
        with Locations((10, 20.75)):
            Rectangle(SKETCH48_W, SKETCH48_H)
    extrude(amount=BOSS_EXTRUDE31_DEPTH)

    # Sketch50 → Cut-Extrude11 (cut)
    with BuildSketch(Plane(origin=(0, 0, -24), x_dir=(-1, 0, 0), z_dir=(0, 0, -1))):
        with Locations((-17.5, 17)):
            Circle(SKETCH50_R)
        with Locations((-37.5, 17)):
            Circle(SKETCH50_R)
    extrude(amount=-CUT_EXTRUDE11_DEPTH, mode=Mode.SUBTRACT)

    # Sketch51 → Boss-Extrude32 (add)
    with BuildSketch(Plane(origin=(0, 0, -24), x_dir=(-1, 0, 0), z_dir=(0, 0, -1))):
        with Locations((-27.646184708, 17.114099589)):
            Rectangle(SKETCH51_W, SKETCH51_H)
    extrude(amount=-BOSS_EXTRUDE32_DEPTH)

    # Sketch54 → Boss-Extrude35 (add)
    with BuildSketch(Plane.XY.offset(-17.5)):
        Polygon((29.5, 22.5), (27.5, 22.5), (27.5, 14.5), (31.5, 14.5), (31.5, 22.5), align=None)
        Polygon((27.5, 14.5), (27.5, 22.5), (25.5, 22.5), (23.5, 22.5), (23.5, 14.5), align=None)
    extrude(amount=BOSS_EXTRUDE35_DEPTH)

    # Sketch55 → Cut-Extrude12 (cut)
    with BuildSketch(Plane.XY.offset(30)):
        with Locations((27.5, 26.25)):
            Rectangle(SKETCH55_W, SKETCH55_H)
    extrude(amount=-CUT_EXTRUDE12_DEPTH, mode=Mode.SUBTRACT)

    # Sketch57 → Boss-Extrude37 (add)
    with BuildSketch(Plane.XY.offset(30)):
        Polygon((35, 23.436848709), (31.5, 20.5), (31.5, 20.428787517), (35, 20.428787517), align=None)
        Polygon((35, 20.428787517), (31.5, 20.428787517), (31.5, 18.5), (35, 18.5), (35, 18.535606241), align=None)
        Polygon((35, 18.5), (31.5, 18.5), (31.5, 16.5), (35, 16.5), (35, 18.464393759), align=None)
        Polygon((35, 16.5), (31.5, 16.5), (35, 13.563151291), align=None)
        Polygon((32.436848709, 11), (29.5, 14.5), (25.5, 14.5), (22.563151291, 11), align=None)
        Polygon((20, 16.5), (23.5, 16.5), (23.5, 18.5), (23.5, 20.5), (20, 23.436848709), (20, 18.535606241), (20, 18.464393759), align=None)
        Polygon((20, 13.563151291), (23.5, 16.5), (20, 16.5), align=None)
    extrude(amount=-BOSS_EXTRUDE37_DEPTH)

    # Sketch61 → Cut-Extrude17 (cut)
    with BuildSketch(Plane.XY.offset(30)):
        Polygon((32.436848709, 8), (22.563151291, 8), (22.563151291, 8.5), (24.660900369, 11), (30.339099631, 11), (32.436848709, 8.5), align=None)
    extrude(amount=-CUT_EXTRUDE17_DEPTH, mode=Mode.SUBTRACT)

    # Sketch62 → Cut-Extrude18 (cut)
    with BuildSketch(Plane.XY.offset(30)):
        with Locations((27.5, 18.5)):
            Rectangle(SKETCH62_W, SKETCH62_H)
    extrude(amount=-CUT_EXTRUDE18_DEPTH, mode=Mode.SUBTRACT)

    # Sketch63 → Cut-Extrude20 (cut)
    with BuildSketch(Plane(origin=(0, 0, -41), x_dir=(-1, 0, 0), z_dir=(0, 0, -1))):
        with Locations((-10, 26)):
            Rectangle(SKETCH63_W, SKETCH63_H)
    extrude(amount=-CUT_EXTRUDE20_DEPTH, mode=Mode.SUBTRACT)

    # Sketch64 → Boss-Extrude38 (add)
    with BuildSketch(Plane(origin=(0, 0, -17.5), x_dir=(-1, 0, 0), z_dir=(0, 0, -1))):
        with Locations((-16.75, 27.25)):
            Rectangle(SKETCH64_W, SKETCH64_H)
    extrude(amount=BOSS_EXTRUDE38_DEPTH)

    # Sketch65 → Cut-Extrude21 (cut)
    with BuildSketch(Plane(origin=(0, 28, 0), x_dir=(1, 0, 0), z_dir=(0, 1, 0))):
        with Locations((48, 16)):
            Rectangle(SKETCH65_W, SKETCH65_H)
    extrude(amount=-CUT_EXTRUDE21_DEPTH, mode=Mode.SUBTRACT)

    # Sketch66 → Boss-Extrude39 (add)
    with BuildSketch(Plane.ZY.offset(-1.5).offset(BOSS_EXTRUDE39_START)):
        with BuildLine():
            ThreePointArc((-30.5, 47), (-20.5, 37), (-10.5, 47))
            Line((-10.5, 47), (-30.5, 47))
        make_face()
        with BuildLine():
            Line((-30.5, 47), (-10.5, 47))
            ThreePointArc((-10.5, 47), (-20.5, 57), (-30.5, 47))
        make_face()
    extrude(amount=BOSS_EXTRUDE39_DEPTH)

    # Sketch67 → Cut-Extrude22 (cut)
    with BuildSketch(Plane.ZY.offset(-1.5)):
        with BuildLine():
            ThreePointArc((-33, 50.5), (-29.338834765, 41.661165235), (-20.5, 38))
            Line((-20.5, 38), (-20.5, 50.5))
            Line((-20.5, 50.5), (-33, 50.5))
        make_face()
        with BuildLine():
            Line((-20.5, 50.5), (-20.5, 38))
            ThreePointArc((-20.5, 38), (-11.661165235, 41.661165235), (-8, 50.5))
            Line((-8, 50.5), (-20.5, 50.5))
        make_face()
        with BuildLine():
            Line((-33, 50.5), (-20.5, 50.5))
            Line((-20.5, 50.5), (-20.5, 63))
            ThreePointArc((-20.5, 63), (-29.338834765, 59.338834765), (-33, 50.5))
        make_face()
        with BuildLine():
            Line((-20.5, 63), (-20.5, 50.5))
            Line((-20.5, 50.5), (-8, 50.5))
            ThreePointArc((-8, 50.5), (-11.661165235, 59.338834765), (-20.5, 63))
        make_face()
    extrude(amount=-CUT_EXTRUDE22_DEPTH, mode=Mode.SUBTRACT)

    # Sketch69 → Boss-Extrude40 (add)
    with BuildSketch(Plane(origin=(0, 26.5, 0), x_dir=(1, 0, 0), z_dir=(0, 1, 0))):
        Polygon((44.5, 14.5), (51.5, 14.5), (51.5, 17.5), (47.5, 17.5), (47.5, 24), (17, 24), (17, 17.5), (44.5, 17.5), align=None)
    extrude(amount=BOSS_EXTRUDE40_DEPTH)

    # Sketch70 → Boss-Extrude41 (add)
    with BuildSketch(Plane(origin=(0, 69, 0), x_dir=(1, 0, 0), z_dir=(0, 1, 0))):
        with Locations((2.5, 20.5)):
            Rectangle(SKETCH70_W, SKETCH70_H)
    extrude(amount=BOSS_EXTRUDE41_DEPTH)

    # Sketch72 → Boss-Extrude42 (add)
    with BuildSketch(Plane(origin=(0, 28, 0), x_dir=(1, 0, 0), z_dir=(0, 1, 0))):
        Polygon((17, -26), (1.5, -26), (1.5, 0), (1.5, 24), (47.5, 24), (47.5, 17.5), (51.5, 17.5), (51.5, -26), (38, -26), (38, 17.5), (17, 17.5), align=None)
    extrude(amount=BOSS_EXTRUDE42_DEPTH)


solid = part_2.part
